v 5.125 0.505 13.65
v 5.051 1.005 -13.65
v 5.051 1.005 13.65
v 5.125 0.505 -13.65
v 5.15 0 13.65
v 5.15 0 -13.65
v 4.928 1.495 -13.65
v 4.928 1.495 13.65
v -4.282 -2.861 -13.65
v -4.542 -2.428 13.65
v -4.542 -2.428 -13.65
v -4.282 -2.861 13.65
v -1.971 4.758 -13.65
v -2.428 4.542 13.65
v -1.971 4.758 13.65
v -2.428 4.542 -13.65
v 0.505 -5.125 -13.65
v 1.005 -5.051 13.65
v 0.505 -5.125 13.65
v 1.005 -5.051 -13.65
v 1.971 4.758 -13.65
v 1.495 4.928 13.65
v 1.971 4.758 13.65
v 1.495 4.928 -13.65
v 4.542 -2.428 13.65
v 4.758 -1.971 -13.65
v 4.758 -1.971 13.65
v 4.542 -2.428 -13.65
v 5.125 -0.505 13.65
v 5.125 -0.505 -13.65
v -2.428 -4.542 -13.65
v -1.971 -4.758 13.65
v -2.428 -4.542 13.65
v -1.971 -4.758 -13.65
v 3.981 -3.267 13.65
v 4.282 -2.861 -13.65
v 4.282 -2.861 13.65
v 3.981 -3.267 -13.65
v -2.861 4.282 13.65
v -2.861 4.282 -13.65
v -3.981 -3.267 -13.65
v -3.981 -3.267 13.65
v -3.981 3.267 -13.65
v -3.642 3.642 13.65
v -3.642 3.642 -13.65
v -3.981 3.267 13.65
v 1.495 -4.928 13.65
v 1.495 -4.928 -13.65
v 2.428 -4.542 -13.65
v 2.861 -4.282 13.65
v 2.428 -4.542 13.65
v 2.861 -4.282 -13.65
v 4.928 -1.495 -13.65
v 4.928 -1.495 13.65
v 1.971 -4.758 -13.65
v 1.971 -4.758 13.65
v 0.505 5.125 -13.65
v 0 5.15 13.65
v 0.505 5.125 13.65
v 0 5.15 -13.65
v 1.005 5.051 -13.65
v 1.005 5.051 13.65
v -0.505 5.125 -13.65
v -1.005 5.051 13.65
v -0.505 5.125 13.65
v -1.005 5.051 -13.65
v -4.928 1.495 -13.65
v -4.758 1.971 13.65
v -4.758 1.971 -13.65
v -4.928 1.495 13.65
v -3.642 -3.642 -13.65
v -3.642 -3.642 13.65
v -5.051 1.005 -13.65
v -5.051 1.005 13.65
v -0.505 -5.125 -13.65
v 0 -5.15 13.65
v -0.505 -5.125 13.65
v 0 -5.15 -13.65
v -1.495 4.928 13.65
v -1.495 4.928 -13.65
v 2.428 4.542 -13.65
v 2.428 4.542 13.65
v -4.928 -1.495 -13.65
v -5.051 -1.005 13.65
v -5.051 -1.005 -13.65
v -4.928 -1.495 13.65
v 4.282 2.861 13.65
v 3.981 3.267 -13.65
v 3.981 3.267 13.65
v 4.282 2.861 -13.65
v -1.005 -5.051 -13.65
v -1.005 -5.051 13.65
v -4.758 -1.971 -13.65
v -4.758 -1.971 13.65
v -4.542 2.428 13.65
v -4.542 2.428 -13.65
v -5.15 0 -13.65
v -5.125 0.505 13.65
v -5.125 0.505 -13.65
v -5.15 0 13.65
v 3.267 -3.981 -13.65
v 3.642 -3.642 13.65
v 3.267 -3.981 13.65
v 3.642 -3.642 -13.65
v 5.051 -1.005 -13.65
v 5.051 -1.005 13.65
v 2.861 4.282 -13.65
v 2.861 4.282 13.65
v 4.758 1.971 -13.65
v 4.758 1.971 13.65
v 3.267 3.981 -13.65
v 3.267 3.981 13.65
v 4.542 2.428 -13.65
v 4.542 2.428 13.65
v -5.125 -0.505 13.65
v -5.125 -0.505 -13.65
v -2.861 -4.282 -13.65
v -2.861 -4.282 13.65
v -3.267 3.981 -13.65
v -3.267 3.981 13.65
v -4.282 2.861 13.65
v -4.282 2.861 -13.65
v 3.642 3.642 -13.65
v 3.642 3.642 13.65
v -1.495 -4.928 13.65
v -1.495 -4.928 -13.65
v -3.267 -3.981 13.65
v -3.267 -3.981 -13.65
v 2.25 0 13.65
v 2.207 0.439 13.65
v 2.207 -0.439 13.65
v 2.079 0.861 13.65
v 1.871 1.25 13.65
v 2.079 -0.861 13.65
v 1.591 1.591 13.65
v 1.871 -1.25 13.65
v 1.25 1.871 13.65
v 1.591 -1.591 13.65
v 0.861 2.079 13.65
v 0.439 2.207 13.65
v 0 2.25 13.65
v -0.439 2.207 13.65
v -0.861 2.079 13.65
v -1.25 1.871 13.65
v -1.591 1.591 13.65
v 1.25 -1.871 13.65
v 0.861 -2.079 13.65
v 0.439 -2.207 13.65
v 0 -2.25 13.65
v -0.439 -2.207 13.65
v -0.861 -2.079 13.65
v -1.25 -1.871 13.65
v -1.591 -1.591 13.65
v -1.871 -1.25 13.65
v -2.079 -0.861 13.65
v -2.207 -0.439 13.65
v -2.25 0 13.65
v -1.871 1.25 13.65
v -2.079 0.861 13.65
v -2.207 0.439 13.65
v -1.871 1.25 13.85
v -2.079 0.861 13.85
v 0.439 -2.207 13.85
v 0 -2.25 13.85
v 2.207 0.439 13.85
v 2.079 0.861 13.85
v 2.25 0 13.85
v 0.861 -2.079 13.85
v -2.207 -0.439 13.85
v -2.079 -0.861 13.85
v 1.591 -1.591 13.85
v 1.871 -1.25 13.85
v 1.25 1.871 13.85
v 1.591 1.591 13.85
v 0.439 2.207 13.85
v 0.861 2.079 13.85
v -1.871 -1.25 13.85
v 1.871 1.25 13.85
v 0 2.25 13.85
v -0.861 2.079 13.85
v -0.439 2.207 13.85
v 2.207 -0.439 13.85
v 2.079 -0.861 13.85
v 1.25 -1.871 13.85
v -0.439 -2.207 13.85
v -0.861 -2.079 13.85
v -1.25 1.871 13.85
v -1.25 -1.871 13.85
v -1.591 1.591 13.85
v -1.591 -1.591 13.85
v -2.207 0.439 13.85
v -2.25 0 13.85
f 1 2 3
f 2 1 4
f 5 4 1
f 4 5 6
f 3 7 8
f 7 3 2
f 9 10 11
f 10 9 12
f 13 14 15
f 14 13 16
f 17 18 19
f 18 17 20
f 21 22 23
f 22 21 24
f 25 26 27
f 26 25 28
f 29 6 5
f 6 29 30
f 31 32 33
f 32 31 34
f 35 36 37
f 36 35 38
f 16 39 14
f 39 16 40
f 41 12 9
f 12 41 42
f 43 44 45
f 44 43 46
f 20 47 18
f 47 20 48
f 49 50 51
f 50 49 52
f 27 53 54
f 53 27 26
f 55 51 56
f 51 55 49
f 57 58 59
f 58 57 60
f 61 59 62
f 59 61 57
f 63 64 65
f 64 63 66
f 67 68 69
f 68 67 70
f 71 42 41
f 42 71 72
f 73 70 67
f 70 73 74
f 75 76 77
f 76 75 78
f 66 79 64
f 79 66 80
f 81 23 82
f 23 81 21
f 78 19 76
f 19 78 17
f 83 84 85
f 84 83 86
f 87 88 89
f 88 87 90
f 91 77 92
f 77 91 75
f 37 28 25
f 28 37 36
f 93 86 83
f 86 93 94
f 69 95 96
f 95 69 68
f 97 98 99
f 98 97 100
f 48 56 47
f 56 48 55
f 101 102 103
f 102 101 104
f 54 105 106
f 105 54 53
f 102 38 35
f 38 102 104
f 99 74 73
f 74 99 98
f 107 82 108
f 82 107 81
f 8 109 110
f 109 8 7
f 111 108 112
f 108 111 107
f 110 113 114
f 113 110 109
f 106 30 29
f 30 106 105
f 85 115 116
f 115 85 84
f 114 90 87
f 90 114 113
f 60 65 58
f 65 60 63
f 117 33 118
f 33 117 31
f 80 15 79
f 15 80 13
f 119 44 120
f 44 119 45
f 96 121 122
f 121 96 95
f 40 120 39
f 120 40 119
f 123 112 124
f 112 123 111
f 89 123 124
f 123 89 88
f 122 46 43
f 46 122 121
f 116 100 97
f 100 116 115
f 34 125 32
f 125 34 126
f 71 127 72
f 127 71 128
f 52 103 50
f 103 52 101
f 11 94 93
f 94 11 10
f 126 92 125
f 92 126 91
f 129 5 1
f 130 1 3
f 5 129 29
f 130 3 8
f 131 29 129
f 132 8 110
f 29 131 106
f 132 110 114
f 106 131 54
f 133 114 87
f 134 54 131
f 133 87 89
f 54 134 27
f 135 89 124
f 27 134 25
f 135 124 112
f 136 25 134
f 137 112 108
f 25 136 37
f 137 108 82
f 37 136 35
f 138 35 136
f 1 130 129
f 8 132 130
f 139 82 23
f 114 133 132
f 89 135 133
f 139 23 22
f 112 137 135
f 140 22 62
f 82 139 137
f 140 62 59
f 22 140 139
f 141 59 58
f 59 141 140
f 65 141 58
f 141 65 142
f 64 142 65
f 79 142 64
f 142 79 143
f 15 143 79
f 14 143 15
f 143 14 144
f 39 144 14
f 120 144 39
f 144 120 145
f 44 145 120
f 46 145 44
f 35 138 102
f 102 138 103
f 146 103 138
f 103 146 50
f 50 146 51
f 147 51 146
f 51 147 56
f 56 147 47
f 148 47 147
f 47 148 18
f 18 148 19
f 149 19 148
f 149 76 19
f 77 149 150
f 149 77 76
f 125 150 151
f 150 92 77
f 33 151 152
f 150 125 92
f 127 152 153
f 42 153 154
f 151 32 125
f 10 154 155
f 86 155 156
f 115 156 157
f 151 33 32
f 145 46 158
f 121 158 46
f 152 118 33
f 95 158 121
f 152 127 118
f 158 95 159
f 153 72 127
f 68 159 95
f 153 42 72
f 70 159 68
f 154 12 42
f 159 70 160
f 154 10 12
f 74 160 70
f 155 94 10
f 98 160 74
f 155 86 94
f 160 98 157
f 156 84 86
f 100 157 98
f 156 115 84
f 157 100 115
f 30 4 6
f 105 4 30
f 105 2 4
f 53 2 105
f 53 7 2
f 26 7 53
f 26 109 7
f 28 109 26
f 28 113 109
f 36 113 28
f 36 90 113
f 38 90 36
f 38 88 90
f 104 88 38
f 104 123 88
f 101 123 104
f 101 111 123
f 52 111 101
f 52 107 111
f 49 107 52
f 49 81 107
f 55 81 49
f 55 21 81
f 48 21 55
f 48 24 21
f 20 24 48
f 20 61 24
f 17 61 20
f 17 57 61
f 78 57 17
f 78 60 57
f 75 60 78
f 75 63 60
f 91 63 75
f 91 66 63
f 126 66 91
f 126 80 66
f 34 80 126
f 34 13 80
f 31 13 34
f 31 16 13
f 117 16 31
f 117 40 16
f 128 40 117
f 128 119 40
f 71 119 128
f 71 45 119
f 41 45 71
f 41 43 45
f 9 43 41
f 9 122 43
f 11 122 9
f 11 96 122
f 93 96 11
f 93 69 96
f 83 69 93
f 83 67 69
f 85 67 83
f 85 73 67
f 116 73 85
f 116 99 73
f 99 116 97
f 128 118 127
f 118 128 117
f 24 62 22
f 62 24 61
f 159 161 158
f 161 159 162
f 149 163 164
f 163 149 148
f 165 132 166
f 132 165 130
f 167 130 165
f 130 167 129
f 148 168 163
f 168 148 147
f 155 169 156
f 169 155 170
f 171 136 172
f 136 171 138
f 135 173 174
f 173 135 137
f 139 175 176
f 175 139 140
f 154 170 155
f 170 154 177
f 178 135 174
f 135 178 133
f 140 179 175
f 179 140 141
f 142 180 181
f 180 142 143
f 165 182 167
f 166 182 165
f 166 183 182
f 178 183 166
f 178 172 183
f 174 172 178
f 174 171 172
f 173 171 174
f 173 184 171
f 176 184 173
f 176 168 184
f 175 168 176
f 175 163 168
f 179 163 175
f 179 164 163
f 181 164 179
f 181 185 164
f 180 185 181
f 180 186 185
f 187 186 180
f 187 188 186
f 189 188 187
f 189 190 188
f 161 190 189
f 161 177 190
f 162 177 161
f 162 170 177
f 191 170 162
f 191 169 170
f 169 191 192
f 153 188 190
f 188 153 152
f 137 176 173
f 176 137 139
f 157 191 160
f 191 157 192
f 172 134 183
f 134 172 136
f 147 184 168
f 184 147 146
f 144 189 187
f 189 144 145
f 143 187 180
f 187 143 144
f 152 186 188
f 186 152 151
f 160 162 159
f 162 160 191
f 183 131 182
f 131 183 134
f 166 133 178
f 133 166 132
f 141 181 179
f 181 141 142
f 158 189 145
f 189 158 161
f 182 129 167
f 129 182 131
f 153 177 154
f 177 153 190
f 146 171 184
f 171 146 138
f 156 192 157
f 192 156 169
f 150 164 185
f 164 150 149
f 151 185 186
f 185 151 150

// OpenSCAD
// Parameters
overall_height_mm = 28.5; //[14.25:57:0.1]
outer_diameter_mm = 10.3; //[5.15:20.6:0.1]
positive_terminal_height_mm = 1; //[0.5:2:0.05]
positive_terminal_diameter_mm = 4.5; //[2.25:9:0.1]
negative_terminal_height_mm = 0.2; //[0.1:0.6:0.05]
negative_terminal_diameter_mm = 6; //[3:12:0.1]
terminal_overlap_mm = 0.8; //[0.5:2:0.1]
body_height_mm = 27.3; //[13.65:54.6:0.1]

// Battery - complete geometry
module battery() {
  union() {
    // Cylindrical cell body
    color("DimGray") {
      translate([0, 0, 0])
        cylinder(h=body_height_mm, r=outer_diameter_mm/2, center=true, $fn=64);
    }
    // Positive terminal button
    color("Silver") {
      translate([0, 0, body_height_mm/2 + positive_terminal_height_mm/2 - terminal_overlap_mm])
        cylinder(h=positive_terminal_height_mm, r=positive_terminal_diameter_mm/2, center=true, $fn=32);
    }
    // Negative terminal contact
    color("Silver") {
      translate([0, 0, -body_height_mm/2 - negative_terminal_height_mm/2 + terminal_overlap_mm])
        cylinder(h=negative_terminal_height_mm, r=negative_terminal_diameter_mm/2, center=true, $fn=32);
    }
  }
}

// Assembly
module assembly() {
  battery();
}

assembly();
